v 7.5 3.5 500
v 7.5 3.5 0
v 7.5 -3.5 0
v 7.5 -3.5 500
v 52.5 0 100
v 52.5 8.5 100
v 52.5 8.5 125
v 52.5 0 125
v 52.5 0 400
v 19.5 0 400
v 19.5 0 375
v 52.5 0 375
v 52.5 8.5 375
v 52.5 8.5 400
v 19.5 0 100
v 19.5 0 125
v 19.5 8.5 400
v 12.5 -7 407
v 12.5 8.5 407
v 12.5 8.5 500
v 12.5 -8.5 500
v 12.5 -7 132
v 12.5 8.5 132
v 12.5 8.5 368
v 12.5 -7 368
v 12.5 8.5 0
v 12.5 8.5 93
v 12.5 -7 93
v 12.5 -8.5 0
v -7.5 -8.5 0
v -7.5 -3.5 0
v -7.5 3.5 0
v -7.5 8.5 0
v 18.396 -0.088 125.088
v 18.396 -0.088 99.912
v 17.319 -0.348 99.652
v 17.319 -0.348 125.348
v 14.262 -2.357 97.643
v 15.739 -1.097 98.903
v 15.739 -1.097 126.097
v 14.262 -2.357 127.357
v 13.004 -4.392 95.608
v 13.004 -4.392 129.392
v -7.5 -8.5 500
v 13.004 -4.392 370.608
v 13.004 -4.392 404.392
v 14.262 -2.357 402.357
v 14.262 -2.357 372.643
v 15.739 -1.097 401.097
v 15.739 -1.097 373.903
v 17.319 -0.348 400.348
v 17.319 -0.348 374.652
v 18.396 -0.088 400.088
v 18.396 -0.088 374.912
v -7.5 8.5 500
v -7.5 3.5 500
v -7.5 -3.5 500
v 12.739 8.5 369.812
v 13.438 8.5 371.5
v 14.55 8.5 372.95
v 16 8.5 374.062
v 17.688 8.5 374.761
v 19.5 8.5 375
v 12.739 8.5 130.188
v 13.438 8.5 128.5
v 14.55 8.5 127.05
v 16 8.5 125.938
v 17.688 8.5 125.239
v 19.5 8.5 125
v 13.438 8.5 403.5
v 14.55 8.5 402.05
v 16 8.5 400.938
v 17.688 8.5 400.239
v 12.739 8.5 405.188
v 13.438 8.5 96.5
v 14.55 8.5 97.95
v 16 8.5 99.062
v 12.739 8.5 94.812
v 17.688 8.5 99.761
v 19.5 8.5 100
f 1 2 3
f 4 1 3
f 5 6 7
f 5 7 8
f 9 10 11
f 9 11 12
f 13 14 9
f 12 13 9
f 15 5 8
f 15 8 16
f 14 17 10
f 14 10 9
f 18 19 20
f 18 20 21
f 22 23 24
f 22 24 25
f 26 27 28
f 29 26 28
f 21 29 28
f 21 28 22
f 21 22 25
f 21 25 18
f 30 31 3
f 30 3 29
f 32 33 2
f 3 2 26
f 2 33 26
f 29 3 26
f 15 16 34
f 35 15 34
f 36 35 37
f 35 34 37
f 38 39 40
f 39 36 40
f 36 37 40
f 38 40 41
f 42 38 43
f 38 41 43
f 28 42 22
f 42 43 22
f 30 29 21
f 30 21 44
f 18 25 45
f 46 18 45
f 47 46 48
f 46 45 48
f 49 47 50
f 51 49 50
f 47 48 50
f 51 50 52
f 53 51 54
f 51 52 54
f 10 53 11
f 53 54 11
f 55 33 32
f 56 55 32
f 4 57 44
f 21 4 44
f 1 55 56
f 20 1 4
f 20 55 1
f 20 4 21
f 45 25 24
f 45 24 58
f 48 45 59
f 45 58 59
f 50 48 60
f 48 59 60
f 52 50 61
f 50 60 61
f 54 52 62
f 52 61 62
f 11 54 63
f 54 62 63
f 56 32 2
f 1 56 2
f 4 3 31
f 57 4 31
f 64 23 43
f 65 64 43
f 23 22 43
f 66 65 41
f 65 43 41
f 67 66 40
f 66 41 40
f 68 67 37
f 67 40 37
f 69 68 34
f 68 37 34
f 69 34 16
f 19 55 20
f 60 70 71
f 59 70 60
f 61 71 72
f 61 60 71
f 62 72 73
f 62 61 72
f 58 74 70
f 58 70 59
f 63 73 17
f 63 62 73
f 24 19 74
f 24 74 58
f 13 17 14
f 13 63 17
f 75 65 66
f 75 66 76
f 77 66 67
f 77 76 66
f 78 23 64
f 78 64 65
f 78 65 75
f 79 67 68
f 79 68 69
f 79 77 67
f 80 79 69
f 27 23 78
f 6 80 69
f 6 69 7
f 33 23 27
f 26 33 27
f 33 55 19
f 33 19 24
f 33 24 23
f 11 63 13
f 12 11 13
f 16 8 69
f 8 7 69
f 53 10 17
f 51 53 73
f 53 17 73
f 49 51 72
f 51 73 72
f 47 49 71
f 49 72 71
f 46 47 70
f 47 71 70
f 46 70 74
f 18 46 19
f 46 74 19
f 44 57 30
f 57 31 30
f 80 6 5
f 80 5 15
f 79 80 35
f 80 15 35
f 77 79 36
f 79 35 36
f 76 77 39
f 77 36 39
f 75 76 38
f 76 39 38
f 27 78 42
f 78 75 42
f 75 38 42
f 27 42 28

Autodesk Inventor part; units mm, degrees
ref_plane "YZ Plane" through (0, 0, 0) normal (1, 0, 0) x (0, 1, 0)
sketch "Sketch1" plane through (0, 0, 0) normal (0, 0, 1) x (1, 0, 0)
  line L0 (-7.5, 3.5) -> (7.5, 3.5)
  line L1 (7.5, 3.5) -> (7.5, -3.5)
  line L2 (7.5, -3.5) -> (-7.5, -3.5)
  line L3 (-7.5, -3.5) -> (-7.5, 3.5)
  line L4 (-7.5, 3.5) -> (7.5, -3.5) construction
  line L5 (7.5, 3.5) -> (-7.5, -3.5) construction
  line L6 (-12.5, 8.5) -> (12.5, 8.5)
  line L7 (12.5, 8.5) -> (12.5, -8.5)
  line L8 (12.5, -8.5) -> (-12.5, -8.5)
  line L9 (-12.5, -8.5) -> (-12.5, 8.5)
  line L10 (-12.5, 8.5) -> (12.5, -8.5) construction
  line L11 (12.5, 8.5) -> (-12.5, -8.5) construction
  line L12 (-7.5, 8.5) -> (-7.5, -8.5)
  point P0 (0, 0)
  dimension "d0" = 15
  dimension "d1" = 7
  dimension "d2" = 25
  dimension "d3" = 17
extrude "Extrusion1" add sketch "Sketch1" along normal blind 500 contours L12 L6 L7 L8 L2 L1 L0
ref_plane "Work Plane1" through (0, 0, 400) normal (0, 0, 1) x (1, 0, 0)
sketch "Sketch2" plane through (0, 0, 400) normal (0, 0, 1) x (1, 0, 0)
  line L0 (-27.5, 8.5) -> (52.5, 8.5)
  line L1 (52.5, 8.5) -> (52.5, -8.5)
  line L2 (52.5, -8.5) -> (-27.5, -8.5)
  line L3 (-27.5, -8.5) -> (-27.5, 8.5)
  line L4 (12.5, -8.5) -> (12.5, 8.5) projected
  line L5 (-27.5, 8.5) -> (52.5, -8.5) construction
  line L6 (52.5, 8.5) -> (-27.5, -8.5) construction
  line L7 (12.5, 0) -> (52.5, 0)
  line L8 (52.5, 0) -> (52.5, 8.5)
  line L9 (52.5, 8.5) -> (12.5, 8.5)
  line L10 (12.5, 8.5) -> (12.5, 0)
  point P0 (0, 0)
  point P1 (12.5, -6.5)
  point P2 (12.5, 6.5)
  point P3 (12.5, 6.5)
  dimension "d8" = 80
  dimension "d9" = 17
extrude "Extrusion2" add sketch "Sketch2" against normal blind 25 contours L0 L1 L7 L4
ref_plane "Work Plane2" through (0, 0, 100) normal (0, 0, -1) x (-1, 0, 0)
sketch "Sketch3" plane through (0, 0, 100) normal (0, 0, -1) x (-1, 0, 0)
  line L0 (-12.5, 8.5) -> (-12.5, 0) projected
  line L1 (-12.5, 8.5) -> (-52.5, 8.5) projected
  line L2 (-52.5, 8.5) -> (-52.5, 0) projected
  line L3 (-52.5, 0) -> (-12.5, 0) projected
  point P0 (0, 0)
extrude "Extrusion3" add sketch "Sketch3" against normal blind 25
fillet "Fillet2" radius 7 6 edges at (12.5, 4.25, 100) (12.5, 0, 112.5) (12.5, 4.25, 125) (12.5, 4.25, 375) (12.5, 0, 387.5) (12.5, 4.25, 400)
properties part number "GUIA DE TAPA PRINCIPAL"
